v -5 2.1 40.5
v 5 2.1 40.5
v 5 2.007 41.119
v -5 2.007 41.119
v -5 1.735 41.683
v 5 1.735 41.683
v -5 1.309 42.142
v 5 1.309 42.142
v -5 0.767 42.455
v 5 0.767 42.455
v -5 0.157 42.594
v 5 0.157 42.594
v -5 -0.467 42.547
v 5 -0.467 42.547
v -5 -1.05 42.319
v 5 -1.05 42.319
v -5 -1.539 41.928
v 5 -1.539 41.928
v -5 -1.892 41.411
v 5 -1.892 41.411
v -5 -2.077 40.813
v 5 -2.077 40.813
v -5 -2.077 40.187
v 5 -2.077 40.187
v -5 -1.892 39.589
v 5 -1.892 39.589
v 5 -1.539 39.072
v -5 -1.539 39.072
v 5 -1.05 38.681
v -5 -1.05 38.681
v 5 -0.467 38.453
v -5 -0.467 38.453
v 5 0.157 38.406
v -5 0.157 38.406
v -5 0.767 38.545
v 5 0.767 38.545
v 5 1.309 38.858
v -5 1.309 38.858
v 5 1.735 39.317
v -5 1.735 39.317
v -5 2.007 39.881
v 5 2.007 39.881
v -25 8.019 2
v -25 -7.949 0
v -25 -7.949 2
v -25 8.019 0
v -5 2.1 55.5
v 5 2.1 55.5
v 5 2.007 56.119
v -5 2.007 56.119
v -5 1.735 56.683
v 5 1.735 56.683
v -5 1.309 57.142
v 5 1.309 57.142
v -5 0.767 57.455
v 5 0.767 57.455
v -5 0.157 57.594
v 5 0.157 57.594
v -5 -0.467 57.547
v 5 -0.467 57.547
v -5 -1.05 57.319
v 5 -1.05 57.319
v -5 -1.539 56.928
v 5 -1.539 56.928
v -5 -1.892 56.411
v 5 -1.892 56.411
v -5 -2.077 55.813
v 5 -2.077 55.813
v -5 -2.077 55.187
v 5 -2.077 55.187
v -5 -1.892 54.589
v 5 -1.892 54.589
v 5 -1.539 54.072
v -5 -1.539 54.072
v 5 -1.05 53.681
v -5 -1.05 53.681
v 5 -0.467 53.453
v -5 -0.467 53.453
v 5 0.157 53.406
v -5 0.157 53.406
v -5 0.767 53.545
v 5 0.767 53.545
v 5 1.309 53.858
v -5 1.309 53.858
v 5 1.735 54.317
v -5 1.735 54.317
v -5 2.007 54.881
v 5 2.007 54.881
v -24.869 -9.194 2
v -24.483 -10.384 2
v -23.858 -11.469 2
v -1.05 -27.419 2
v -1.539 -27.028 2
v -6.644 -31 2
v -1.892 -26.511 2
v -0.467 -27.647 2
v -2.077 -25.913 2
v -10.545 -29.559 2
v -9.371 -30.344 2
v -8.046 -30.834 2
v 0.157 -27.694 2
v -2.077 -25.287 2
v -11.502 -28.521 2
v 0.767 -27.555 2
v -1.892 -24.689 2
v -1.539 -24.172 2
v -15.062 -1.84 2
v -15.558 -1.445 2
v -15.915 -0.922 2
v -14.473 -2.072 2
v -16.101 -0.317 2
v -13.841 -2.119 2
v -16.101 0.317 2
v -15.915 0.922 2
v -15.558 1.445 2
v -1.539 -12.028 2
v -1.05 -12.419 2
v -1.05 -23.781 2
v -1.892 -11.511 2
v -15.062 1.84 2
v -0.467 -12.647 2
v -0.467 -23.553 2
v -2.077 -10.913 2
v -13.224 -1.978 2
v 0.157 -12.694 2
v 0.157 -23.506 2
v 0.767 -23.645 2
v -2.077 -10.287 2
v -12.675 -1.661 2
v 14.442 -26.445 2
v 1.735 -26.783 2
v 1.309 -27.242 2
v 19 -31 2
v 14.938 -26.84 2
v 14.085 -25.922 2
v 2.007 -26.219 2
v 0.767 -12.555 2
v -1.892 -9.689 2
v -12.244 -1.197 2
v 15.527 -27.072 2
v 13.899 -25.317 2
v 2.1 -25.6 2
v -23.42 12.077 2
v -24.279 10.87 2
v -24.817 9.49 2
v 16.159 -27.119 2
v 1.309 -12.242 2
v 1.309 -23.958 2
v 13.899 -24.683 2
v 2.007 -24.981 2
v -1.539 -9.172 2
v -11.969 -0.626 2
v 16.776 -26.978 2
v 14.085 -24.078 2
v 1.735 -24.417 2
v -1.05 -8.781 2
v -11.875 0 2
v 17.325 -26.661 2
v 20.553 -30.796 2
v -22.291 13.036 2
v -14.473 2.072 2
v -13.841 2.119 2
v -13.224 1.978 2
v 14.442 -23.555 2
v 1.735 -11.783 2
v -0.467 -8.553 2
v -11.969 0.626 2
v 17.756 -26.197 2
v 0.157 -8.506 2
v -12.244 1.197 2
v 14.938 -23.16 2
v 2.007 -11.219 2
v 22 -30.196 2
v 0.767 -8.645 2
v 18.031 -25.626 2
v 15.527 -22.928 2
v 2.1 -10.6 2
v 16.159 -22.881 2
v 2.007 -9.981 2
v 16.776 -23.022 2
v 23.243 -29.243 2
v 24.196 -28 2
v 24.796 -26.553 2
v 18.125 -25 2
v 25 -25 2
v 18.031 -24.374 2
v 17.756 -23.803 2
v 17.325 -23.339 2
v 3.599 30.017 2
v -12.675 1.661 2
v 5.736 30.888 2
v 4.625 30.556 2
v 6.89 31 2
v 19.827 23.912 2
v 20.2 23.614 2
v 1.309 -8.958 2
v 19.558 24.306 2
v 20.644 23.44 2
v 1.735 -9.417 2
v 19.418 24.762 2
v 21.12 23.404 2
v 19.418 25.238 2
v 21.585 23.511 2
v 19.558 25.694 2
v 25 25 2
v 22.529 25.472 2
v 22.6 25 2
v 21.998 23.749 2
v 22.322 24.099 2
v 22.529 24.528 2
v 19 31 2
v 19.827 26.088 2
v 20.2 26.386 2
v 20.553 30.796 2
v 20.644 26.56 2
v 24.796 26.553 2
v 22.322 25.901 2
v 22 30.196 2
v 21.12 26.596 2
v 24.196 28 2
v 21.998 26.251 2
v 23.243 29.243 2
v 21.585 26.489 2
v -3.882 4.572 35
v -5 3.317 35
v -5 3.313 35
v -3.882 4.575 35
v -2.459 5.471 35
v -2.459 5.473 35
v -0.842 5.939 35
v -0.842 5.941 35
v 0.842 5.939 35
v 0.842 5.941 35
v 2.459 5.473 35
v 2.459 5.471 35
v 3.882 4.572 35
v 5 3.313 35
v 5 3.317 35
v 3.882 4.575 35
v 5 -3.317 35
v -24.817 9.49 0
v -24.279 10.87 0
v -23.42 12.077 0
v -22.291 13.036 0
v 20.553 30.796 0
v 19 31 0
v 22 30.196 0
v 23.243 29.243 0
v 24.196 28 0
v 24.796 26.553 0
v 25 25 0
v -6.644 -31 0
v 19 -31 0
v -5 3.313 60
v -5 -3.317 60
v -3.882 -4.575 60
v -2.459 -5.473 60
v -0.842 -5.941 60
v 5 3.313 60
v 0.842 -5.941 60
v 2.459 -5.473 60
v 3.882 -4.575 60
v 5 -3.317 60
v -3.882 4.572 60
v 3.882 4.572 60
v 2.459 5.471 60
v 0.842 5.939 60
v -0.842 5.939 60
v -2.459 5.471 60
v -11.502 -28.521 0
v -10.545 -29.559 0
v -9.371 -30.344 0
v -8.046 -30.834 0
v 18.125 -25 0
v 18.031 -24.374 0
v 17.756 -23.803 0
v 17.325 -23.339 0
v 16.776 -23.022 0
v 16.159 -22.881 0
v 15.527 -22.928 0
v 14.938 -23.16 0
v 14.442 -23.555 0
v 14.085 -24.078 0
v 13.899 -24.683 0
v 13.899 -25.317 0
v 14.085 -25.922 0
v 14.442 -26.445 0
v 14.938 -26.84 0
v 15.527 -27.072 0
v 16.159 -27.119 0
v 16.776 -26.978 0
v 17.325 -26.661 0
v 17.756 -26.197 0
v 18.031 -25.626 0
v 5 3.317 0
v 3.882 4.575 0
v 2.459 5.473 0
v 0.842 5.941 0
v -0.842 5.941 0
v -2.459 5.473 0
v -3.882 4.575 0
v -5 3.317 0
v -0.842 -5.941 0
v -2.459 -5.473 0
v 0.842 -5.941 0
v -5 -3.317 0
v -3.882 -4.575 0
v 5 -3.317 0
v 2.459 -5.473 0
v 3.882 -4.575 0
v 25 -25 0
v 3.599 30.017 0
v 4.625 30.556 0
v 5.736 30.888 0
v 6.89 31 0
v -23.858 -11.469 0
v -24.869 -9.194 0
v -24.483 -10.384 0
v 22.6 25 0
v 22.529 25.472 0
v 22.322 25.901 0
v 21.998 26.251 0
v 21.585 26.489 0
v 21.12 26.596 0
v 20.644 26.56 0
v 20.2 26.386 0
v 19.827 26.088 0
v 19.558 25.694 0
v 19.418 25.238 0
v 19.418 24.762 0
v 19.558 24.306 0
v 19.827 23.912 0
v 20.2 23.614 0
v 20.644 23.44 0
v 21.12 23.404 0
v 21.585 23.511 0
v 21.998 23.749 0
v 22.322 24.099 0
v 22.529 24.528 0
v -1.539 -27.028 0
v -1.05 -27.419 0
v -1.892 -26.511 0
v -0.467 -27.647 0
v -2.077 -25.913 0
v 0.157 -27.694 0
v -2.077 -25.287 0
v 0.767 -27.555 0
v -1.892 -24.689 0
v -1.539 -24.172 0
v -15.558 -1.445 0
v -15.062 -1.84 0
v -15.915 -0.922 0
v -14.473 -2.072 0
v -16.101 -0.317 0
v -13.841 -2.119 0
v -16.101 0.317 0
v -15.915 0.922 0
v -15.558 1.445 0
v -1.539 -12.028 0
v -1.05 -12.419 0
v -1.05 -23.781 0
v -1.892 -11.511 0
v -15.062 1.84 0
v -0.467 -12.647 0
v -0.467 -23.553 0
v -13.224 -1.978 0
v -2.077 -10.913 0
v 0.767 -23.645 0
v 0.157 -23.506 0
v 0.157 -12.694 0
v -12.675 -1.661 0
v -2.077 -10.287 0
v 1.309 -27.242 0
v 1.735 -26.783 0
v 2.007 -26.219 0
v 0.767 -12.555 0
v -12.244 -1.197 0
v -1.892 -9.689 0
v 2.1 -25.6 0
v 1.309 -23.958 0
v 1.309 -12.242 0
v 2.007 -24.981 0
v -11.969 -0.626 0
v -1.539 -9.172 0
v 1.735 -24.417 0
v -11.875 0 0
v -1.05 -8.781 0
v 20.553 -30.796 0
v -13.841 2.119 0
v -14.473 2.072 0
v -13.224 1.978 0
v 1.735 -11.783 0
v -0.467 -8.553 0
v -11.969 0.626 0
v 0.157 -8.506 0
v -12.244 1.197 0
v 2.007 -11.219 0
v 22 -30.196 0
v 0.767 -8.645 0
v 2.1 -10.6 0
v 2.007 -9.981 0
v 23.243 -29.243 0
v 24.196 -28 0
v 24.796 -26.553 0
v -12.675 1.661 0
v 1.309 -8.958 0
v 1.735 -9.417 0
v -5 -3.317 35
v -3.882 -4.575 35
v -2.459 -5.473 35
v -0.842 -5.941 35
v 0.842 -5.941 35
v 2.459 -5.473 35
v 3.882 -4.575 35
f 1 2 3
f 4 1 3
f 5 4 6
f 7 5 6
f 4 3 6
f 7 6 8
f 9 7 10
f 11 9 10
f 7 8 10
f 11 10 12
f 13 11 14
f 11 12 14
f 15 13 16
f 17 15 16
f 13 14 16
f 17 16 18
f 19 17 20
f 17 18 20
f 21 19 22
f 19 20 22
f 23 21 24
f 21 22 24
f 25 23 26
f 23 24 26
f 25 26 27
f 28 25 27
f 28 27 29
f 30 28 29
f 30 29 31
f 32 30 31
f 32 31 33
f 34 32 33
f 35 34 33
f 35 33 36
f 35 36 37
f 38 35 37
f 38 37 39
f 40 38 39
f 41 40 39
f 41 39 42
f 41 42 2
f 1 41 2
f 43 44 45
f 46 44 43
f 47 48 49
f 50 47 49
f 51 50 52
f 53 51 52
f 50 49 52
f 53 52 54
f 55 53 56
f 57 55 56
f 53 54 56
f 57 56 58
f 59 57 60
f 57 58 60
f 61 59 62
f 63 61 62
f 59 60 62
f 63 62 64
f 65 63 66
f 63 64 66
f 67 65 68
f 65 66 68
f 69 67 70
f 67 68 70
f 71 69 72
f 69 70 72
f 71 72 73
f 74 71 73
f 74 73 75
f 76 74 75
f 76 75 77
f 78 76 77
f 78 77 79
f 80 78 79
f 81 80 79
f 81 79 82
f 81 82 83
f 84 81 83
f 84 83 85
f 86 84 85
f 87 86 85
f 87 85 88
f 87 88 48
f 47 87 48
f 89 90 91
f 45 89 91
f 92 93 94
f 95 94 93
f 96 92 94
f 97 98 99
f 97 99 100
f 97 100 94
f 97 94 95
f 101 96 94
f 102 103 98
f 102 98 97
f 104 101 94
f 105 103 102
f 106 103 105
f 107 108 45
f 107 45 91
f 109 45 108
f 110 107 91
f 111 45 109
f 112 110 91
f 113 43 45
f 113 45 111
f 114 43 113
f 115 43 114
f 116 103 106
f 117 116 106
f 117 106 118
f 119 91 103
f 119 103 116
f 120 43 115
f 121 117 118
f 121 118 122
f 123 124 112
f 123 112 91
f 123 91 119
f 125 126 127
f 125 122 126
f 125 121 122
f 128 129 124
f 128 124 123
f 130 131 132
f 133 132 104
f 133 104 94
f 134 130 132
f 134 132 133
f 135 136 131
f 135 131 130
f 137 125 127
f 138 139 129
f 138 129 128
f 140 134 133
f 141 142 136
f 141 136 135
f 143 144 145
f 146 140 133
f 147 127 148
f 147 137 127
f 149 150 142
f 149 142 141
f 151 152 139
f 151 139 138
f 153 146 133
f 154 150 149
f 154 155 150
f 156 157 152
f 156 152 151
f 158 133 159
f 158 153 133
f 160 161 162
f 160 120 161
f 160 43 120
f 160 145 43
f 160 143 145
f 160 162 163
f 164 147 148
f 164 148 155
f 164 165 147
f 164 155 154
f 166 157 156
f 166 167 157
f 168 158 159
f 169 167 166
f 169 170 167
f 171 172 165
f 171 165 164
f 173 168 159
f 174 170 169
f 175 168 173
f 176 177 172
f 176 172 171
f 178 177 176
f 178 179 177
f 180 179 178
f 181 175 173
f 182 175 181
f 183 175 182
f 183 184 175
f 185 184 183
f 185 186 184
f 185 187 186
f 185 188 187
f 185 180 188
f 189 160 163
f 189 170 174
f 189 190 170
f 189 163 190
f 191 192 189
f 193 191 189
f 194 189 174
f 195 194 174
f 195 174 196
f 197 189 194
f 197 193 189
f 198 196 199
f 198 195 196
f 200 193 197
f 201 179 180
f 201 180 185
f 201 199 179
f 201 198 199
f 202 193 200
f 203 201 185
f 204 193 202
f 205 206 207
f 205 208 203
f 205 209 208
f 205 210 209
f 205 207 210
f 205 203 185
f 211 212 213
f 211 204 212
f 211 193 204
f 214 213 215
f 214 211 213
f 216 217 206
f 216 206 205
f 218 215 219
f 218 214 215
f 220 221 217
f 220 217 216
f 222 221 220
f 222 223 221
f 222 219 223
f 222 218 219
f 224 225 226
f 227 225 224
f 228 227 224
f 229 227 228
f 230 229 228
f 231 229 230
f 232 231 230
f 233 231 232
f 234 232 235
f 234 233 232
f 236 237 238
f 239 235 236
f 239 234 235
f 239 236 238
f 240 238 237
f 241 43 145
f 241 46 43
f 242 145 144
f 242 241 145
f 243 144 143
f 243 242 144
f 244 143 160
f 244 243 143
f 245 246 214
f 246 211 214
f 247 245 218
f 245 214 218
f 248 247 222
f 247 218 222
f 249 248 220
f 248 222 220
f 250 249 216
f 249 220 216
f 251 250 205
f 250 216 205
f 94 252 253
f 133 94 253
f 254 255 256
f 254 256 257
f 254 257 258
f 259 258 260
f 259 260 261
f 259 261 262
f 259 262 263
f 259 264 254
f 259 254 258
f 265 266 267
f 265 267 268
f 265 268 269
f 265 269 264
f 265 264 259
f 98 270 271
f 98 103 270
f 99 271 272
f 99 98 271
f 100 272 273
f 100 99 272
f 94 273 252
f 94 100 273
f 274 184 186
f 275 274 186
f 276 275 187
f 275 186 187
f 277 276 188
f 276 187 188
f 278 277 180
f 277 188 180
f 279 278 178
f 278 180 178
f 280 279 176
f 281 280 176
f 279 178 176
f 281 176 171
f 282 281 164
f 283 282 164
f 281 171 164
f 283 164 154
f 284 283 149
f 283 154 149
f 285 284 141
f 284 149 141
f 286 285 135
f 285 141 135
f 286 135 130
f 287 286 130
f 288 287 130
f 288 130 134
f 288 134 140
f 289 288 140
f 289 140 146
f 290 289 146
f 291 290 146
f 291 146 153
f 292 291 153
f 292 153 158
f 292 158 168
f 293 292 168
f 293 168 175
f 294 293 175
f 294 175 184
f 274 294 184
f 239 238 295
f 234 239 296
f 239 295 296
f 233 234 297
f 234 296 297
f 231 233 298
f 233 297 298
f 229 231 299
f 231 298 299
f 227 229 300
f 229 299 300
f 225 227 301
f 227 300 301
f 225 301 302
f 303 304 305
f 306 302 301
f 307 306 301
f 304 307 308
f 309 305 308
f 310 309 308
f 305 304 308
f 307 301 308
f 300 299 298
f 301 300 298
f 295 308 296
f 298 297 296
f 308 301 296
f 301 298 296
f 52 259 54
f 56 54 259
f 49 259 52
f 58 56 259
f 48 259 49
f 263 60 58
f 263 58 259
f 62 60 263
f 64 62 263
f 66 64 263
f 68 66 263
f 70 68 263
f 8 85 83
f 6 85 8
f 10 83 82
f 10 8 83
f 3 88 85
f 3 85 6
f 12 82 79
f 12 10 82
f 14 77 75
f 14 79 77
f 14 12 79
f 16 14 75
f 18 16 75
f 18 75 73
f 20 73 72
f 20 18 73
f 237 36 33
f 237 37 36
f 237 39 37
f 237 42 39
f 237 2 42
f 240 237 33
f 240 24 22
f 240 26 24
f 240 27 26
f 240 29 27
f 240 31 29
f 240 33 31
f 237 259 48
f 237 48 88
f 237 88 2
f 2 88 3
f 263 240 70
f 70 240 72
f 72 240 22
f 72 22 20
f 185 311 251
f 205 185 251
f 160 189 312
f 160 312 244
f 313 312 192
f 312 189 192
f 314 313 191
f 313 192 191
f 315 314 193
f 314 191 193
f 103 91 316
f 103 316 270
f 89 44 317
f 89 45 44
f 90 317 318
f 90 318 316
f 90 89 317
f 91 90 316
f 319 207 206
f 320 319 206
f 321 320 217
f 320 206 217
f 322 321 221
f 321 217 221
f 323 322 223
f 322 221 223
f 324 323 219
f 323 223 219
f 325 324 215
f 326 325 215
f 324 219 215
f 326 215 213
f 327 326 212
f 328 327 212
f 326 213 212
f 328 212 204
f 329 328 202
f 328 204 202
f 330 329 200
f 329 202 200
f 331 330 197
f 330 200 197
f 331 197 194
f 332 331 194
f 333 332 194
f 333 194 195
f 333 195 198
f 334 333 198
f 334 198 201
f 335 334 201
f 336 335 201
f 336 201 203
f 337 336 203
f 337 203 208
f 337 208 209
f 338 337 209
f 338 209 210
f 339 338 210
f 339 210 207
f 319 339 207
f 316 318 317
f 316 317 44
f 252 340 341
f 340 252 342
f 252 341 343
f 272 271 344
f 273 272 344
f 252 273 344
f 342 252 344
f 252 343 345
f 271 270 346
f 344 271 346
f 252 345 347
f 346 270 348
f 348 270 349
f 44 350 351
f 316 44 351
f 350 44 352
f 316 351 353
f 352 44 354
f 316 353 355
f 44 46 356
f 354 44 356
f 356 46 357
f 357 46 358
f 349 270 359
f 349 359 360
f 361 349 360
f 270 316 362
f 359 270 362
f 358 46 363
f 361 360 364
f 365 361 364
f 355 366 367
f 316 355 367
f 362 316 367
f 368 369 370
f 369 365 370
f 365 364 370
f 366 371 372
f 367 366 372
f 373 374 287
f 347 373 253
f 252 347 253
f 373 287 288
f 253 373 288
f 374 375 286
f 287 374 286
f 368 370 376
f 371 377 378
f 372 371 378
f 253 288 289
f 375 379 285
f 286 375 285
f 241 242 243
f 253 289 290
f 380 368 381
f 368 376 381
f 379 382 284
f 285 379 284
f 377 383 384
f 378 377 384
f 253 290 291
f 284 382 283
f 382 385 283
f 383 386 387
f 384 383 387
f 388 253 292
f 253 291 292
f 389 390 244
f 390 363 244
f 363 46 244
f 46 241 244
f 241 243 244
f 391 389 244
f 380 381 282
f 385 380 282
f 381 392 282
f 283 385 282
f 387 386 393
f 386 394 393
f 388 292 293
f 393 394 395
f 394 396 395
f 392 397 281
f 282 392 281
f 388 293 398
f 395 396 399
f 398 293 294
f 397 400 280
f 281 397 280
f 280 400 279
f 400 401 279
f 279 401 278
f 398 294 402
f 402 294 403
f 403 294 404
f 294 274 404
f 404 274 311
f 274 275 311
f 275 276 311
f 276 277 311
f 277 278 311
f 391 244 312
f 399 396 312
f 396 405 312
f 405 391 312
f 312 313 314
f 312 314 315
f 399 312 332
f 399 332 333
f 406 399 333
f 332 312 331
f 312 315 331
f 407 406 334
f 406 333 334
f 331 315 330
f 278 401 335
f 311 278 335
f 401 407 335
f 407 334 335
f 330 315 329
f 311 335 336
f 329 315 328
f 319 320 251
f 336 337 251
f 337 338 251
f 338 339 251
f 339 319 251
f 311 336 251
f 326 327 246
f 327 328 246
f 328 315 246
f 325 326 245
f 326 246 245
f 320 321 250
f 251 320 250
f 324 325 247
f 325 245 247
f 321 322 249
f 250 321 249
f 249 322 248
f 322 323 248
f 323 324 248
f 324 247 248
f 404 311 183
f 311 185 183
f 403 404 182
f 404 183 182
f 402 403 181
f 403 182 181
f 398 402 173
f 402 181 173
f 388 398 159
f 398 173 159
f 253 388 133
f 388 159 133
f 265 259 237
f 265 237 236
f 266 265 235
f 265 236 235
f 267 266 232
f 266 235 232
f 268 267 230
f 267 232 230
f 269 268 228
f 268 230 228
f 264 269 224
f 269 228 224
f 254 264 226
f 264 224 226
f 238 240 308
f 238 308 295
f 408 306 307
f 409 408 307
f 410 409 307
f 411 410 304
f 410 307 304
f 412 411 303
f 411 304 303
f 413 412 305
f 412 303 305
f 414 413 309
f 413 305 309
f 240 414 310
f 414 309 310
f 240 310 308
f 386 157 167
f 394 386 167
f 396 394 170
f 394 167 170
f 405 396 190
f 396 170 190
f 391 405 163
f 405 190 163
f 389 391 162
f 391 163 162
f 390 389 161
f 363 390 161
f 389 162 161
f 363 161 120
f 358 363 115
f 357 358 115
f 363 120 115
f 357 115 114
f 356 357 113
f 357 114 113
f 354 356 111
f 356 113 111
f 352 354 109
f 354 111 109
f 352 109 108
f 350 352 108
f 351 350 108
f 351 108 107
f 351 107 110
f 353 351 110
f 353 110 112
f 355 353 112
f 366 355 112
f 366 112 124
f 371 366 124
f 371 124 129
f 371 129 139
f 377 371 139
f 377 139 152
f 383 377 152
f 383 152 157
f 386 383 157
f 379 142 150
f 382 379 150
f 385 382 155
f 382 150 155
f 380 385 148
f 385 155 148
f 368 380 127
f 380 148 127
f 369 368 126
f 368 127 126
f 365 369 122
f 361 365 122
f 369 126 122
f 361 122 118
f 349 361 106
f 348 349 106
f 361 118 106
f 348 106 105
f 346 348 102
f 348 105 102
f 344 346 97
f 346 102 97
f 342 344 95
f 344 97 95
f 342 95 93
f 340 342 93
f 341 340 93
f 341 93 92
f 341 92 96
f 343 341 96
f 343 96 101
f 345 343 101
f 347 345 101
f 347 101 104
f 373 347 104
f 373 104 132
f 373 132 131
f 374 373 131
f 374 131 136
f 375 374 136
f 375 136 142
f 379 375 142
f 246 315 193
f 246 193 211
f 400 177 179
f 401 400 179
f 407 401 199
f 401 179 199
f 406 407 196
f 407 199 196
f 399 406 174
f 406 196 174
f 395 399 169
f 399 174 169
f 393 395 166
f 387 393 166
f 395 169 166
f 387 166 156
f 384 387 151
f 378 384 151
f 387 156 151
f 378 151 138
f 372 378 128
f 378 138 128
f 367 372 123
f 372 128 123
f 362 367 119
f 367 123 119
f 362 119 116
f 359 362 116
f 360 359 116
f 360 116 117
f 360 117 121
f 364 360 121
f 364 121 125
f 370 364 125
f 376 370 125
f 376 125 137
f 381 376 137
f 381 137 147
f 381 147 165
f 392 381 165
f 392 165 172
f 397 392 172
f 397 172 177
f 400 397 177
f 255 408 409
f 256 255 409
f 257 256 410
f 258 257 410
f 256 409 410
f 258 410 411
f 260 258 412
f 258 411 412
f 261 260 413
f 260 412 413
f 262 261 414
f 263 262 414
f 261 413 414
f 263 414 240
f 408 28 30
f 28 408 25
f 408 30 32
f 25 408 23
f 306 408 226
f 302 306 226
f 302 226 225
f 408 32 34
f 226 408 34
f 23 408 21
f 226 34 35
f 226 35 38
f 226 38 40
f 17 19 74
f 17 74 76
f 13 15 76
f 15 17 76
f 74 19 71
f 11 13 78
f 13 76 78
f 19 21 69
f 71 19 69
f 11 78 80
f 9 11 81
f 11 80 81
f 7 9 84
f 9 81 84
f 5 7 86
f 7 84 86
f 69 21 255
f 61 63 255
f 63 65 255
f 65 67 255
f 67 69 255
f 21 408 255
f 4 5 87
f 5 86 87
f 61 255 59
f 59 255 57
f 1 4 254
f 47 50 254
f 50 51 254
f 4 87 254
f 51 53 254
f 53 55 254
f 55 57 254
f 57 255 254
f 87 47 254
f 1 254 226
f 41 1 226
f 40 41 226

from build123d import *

# Parameters (mm, degrees)
SKETCH_W        = 50
SKETCH_H        = 62
PAD_DEPTH       = 2
SKETCH001_R     = 2.125
SKETCH001_R_2   = 1.6
POCKET_DEPTH    = 2.001
SKETCH005_R     = 2.1
POCKET002_DEPTH = 2.001
POCKET003_DEPTH = 2.001
FILLET_R        = 6
SKETCH002_R     = 6
PAD001_DEPTH    = 35
PAD002_DEPTH    = 25
SKETCH004_R     = 2.1
POCKET001_DEPTH = 11.001
SKETCH007_W     = 5.144716
SKETCH007_H     = 23.774506
SKETCH007_W_2   = 6.816065
SKETCH007_H_2   = 22.941175
POCKET004_DEPTH = 35.001


with BuildPart() as basemountfixbody:
    # Sketch (on XY_Plane001 of Origin002) → Pad (new body)
    with BuildSketch(Plane.XY):
        Rectangle(SKETCH_W, SKETCH_H)
    extrude(amount=PAD_DEPTH)

    # Sketch001 (on Face6 of Pad) → Pocket (cut, through all)
    with BuildSketch(Plane.XY.offset(2)):
        with Locations((16, -25)):
            Circle(SKETCH001_R)
        with Locations((-14, 0)):
            Circle(SKETCH001_R)
        with Locations((21, 25)):
            Circle(SKETCH001_R_2)
    extrude(amount=-POCKET_DEPTH, mode=Mode.SUBTRACT)

    # Sketch005 (on Face5 of Pocket) → Pocket002 (cut, through all)
    with BuildSketch(Plane.XY.offset(2)):
        with Locations((0, -10.6)):
            Circle(SKETCH005_R)
        with Locations((0, -25.6)):
            Circle(SKETCH005_R)
    extrude(amount=-POCKET002_DEPTH, mode=Mode.SUBTRACT)

    # Sketch006 (on Face5 of Pocket002) → Pocket003 (cut, through all)
    with BuildSketch(Plane.XY.offset(2)):
        Polygon((9.967307, 34.193909), (-27.579384, 9.567701), (-27.579384, -6.334426), (-5.49309, -36.813499), (-39.616409, -35.377892), (-36.745193, 45.789211), align=None)
    extrude(amount=-POCKET003_DEPTH, mode=Mode.SUBTRACT)

    # Fillet
    fillet_edges = [basemountfixbody.edges().sort_by_distance(p)[0] for p in [
        (-9.705772, -31, 1),
        (-25, -9.893974, 1),
        (-25, 11.259473, 1),
        (5.097669, 31, 1),
        (25, 31, 1),
        (25, -31, 1),
    ]]
    fillet(fillet_edges, radius=FILLET_R)


with BuildPart() as basemountswivelbody:
    # Sketch002 (on XY_Plane003 of Origin006) → Pad001 (new body)
    with BuildSketch(Plane.XY):
        Circle(SKETCH002_R)
    extrude(amount=PAD001_DEPTH)

    # Sketch003 (on Face3 of Pad001) → Pad002 (join)
    with BuildSketch(Plane.XY.offset(35)):
        with BuildLine():
            ThreePointArc((-5, -3.316625), (0, -6), (5, -3.316625))
            Line((5, 3.313375), (5, -3.316625))
            ThreePointArc((5, 3.313375), (0, 5.998204), (-5, 3.313375))
            Line((-5, 3.313375), (-5, -3.316625))
        make_face()
    extrude(amount=PAD002_DEPTH)

    # Sketch004 (on Face2 of Pad002) → Pocket001 (cut, through all)
    with BuildSketch(Plane.YZ.offset(5)):
        with Locations((0, 55.5)):
            Circle(SKETCH004_R)
        with Locations((0, 40.5)):
            Circle(SKETCH004_R)
    extrude(amount=-POCKET001_DEPTH, mode=Mode.SUBTRACT)

    # Sketch007 (on Face1 of Pocket001) → Pocket004 (cut, through all)
    with BuildSketch(Plane.XY.offset(35)):
        with Locations((-7.572358, -1.246686)):
            Rectangle(SKETCH007_W, SKETCH007_H)
        with Locations((8.408033, 0.836648)):
            Rectangle(SKETCH007_W_2, SKETCH007_H_2)
    extrude(amount=-POCKET004_DEPTH, mode=Mode.SUBTRACT)


solid = Compound([basemountfixbody.part, basemountswivelbody.part])
